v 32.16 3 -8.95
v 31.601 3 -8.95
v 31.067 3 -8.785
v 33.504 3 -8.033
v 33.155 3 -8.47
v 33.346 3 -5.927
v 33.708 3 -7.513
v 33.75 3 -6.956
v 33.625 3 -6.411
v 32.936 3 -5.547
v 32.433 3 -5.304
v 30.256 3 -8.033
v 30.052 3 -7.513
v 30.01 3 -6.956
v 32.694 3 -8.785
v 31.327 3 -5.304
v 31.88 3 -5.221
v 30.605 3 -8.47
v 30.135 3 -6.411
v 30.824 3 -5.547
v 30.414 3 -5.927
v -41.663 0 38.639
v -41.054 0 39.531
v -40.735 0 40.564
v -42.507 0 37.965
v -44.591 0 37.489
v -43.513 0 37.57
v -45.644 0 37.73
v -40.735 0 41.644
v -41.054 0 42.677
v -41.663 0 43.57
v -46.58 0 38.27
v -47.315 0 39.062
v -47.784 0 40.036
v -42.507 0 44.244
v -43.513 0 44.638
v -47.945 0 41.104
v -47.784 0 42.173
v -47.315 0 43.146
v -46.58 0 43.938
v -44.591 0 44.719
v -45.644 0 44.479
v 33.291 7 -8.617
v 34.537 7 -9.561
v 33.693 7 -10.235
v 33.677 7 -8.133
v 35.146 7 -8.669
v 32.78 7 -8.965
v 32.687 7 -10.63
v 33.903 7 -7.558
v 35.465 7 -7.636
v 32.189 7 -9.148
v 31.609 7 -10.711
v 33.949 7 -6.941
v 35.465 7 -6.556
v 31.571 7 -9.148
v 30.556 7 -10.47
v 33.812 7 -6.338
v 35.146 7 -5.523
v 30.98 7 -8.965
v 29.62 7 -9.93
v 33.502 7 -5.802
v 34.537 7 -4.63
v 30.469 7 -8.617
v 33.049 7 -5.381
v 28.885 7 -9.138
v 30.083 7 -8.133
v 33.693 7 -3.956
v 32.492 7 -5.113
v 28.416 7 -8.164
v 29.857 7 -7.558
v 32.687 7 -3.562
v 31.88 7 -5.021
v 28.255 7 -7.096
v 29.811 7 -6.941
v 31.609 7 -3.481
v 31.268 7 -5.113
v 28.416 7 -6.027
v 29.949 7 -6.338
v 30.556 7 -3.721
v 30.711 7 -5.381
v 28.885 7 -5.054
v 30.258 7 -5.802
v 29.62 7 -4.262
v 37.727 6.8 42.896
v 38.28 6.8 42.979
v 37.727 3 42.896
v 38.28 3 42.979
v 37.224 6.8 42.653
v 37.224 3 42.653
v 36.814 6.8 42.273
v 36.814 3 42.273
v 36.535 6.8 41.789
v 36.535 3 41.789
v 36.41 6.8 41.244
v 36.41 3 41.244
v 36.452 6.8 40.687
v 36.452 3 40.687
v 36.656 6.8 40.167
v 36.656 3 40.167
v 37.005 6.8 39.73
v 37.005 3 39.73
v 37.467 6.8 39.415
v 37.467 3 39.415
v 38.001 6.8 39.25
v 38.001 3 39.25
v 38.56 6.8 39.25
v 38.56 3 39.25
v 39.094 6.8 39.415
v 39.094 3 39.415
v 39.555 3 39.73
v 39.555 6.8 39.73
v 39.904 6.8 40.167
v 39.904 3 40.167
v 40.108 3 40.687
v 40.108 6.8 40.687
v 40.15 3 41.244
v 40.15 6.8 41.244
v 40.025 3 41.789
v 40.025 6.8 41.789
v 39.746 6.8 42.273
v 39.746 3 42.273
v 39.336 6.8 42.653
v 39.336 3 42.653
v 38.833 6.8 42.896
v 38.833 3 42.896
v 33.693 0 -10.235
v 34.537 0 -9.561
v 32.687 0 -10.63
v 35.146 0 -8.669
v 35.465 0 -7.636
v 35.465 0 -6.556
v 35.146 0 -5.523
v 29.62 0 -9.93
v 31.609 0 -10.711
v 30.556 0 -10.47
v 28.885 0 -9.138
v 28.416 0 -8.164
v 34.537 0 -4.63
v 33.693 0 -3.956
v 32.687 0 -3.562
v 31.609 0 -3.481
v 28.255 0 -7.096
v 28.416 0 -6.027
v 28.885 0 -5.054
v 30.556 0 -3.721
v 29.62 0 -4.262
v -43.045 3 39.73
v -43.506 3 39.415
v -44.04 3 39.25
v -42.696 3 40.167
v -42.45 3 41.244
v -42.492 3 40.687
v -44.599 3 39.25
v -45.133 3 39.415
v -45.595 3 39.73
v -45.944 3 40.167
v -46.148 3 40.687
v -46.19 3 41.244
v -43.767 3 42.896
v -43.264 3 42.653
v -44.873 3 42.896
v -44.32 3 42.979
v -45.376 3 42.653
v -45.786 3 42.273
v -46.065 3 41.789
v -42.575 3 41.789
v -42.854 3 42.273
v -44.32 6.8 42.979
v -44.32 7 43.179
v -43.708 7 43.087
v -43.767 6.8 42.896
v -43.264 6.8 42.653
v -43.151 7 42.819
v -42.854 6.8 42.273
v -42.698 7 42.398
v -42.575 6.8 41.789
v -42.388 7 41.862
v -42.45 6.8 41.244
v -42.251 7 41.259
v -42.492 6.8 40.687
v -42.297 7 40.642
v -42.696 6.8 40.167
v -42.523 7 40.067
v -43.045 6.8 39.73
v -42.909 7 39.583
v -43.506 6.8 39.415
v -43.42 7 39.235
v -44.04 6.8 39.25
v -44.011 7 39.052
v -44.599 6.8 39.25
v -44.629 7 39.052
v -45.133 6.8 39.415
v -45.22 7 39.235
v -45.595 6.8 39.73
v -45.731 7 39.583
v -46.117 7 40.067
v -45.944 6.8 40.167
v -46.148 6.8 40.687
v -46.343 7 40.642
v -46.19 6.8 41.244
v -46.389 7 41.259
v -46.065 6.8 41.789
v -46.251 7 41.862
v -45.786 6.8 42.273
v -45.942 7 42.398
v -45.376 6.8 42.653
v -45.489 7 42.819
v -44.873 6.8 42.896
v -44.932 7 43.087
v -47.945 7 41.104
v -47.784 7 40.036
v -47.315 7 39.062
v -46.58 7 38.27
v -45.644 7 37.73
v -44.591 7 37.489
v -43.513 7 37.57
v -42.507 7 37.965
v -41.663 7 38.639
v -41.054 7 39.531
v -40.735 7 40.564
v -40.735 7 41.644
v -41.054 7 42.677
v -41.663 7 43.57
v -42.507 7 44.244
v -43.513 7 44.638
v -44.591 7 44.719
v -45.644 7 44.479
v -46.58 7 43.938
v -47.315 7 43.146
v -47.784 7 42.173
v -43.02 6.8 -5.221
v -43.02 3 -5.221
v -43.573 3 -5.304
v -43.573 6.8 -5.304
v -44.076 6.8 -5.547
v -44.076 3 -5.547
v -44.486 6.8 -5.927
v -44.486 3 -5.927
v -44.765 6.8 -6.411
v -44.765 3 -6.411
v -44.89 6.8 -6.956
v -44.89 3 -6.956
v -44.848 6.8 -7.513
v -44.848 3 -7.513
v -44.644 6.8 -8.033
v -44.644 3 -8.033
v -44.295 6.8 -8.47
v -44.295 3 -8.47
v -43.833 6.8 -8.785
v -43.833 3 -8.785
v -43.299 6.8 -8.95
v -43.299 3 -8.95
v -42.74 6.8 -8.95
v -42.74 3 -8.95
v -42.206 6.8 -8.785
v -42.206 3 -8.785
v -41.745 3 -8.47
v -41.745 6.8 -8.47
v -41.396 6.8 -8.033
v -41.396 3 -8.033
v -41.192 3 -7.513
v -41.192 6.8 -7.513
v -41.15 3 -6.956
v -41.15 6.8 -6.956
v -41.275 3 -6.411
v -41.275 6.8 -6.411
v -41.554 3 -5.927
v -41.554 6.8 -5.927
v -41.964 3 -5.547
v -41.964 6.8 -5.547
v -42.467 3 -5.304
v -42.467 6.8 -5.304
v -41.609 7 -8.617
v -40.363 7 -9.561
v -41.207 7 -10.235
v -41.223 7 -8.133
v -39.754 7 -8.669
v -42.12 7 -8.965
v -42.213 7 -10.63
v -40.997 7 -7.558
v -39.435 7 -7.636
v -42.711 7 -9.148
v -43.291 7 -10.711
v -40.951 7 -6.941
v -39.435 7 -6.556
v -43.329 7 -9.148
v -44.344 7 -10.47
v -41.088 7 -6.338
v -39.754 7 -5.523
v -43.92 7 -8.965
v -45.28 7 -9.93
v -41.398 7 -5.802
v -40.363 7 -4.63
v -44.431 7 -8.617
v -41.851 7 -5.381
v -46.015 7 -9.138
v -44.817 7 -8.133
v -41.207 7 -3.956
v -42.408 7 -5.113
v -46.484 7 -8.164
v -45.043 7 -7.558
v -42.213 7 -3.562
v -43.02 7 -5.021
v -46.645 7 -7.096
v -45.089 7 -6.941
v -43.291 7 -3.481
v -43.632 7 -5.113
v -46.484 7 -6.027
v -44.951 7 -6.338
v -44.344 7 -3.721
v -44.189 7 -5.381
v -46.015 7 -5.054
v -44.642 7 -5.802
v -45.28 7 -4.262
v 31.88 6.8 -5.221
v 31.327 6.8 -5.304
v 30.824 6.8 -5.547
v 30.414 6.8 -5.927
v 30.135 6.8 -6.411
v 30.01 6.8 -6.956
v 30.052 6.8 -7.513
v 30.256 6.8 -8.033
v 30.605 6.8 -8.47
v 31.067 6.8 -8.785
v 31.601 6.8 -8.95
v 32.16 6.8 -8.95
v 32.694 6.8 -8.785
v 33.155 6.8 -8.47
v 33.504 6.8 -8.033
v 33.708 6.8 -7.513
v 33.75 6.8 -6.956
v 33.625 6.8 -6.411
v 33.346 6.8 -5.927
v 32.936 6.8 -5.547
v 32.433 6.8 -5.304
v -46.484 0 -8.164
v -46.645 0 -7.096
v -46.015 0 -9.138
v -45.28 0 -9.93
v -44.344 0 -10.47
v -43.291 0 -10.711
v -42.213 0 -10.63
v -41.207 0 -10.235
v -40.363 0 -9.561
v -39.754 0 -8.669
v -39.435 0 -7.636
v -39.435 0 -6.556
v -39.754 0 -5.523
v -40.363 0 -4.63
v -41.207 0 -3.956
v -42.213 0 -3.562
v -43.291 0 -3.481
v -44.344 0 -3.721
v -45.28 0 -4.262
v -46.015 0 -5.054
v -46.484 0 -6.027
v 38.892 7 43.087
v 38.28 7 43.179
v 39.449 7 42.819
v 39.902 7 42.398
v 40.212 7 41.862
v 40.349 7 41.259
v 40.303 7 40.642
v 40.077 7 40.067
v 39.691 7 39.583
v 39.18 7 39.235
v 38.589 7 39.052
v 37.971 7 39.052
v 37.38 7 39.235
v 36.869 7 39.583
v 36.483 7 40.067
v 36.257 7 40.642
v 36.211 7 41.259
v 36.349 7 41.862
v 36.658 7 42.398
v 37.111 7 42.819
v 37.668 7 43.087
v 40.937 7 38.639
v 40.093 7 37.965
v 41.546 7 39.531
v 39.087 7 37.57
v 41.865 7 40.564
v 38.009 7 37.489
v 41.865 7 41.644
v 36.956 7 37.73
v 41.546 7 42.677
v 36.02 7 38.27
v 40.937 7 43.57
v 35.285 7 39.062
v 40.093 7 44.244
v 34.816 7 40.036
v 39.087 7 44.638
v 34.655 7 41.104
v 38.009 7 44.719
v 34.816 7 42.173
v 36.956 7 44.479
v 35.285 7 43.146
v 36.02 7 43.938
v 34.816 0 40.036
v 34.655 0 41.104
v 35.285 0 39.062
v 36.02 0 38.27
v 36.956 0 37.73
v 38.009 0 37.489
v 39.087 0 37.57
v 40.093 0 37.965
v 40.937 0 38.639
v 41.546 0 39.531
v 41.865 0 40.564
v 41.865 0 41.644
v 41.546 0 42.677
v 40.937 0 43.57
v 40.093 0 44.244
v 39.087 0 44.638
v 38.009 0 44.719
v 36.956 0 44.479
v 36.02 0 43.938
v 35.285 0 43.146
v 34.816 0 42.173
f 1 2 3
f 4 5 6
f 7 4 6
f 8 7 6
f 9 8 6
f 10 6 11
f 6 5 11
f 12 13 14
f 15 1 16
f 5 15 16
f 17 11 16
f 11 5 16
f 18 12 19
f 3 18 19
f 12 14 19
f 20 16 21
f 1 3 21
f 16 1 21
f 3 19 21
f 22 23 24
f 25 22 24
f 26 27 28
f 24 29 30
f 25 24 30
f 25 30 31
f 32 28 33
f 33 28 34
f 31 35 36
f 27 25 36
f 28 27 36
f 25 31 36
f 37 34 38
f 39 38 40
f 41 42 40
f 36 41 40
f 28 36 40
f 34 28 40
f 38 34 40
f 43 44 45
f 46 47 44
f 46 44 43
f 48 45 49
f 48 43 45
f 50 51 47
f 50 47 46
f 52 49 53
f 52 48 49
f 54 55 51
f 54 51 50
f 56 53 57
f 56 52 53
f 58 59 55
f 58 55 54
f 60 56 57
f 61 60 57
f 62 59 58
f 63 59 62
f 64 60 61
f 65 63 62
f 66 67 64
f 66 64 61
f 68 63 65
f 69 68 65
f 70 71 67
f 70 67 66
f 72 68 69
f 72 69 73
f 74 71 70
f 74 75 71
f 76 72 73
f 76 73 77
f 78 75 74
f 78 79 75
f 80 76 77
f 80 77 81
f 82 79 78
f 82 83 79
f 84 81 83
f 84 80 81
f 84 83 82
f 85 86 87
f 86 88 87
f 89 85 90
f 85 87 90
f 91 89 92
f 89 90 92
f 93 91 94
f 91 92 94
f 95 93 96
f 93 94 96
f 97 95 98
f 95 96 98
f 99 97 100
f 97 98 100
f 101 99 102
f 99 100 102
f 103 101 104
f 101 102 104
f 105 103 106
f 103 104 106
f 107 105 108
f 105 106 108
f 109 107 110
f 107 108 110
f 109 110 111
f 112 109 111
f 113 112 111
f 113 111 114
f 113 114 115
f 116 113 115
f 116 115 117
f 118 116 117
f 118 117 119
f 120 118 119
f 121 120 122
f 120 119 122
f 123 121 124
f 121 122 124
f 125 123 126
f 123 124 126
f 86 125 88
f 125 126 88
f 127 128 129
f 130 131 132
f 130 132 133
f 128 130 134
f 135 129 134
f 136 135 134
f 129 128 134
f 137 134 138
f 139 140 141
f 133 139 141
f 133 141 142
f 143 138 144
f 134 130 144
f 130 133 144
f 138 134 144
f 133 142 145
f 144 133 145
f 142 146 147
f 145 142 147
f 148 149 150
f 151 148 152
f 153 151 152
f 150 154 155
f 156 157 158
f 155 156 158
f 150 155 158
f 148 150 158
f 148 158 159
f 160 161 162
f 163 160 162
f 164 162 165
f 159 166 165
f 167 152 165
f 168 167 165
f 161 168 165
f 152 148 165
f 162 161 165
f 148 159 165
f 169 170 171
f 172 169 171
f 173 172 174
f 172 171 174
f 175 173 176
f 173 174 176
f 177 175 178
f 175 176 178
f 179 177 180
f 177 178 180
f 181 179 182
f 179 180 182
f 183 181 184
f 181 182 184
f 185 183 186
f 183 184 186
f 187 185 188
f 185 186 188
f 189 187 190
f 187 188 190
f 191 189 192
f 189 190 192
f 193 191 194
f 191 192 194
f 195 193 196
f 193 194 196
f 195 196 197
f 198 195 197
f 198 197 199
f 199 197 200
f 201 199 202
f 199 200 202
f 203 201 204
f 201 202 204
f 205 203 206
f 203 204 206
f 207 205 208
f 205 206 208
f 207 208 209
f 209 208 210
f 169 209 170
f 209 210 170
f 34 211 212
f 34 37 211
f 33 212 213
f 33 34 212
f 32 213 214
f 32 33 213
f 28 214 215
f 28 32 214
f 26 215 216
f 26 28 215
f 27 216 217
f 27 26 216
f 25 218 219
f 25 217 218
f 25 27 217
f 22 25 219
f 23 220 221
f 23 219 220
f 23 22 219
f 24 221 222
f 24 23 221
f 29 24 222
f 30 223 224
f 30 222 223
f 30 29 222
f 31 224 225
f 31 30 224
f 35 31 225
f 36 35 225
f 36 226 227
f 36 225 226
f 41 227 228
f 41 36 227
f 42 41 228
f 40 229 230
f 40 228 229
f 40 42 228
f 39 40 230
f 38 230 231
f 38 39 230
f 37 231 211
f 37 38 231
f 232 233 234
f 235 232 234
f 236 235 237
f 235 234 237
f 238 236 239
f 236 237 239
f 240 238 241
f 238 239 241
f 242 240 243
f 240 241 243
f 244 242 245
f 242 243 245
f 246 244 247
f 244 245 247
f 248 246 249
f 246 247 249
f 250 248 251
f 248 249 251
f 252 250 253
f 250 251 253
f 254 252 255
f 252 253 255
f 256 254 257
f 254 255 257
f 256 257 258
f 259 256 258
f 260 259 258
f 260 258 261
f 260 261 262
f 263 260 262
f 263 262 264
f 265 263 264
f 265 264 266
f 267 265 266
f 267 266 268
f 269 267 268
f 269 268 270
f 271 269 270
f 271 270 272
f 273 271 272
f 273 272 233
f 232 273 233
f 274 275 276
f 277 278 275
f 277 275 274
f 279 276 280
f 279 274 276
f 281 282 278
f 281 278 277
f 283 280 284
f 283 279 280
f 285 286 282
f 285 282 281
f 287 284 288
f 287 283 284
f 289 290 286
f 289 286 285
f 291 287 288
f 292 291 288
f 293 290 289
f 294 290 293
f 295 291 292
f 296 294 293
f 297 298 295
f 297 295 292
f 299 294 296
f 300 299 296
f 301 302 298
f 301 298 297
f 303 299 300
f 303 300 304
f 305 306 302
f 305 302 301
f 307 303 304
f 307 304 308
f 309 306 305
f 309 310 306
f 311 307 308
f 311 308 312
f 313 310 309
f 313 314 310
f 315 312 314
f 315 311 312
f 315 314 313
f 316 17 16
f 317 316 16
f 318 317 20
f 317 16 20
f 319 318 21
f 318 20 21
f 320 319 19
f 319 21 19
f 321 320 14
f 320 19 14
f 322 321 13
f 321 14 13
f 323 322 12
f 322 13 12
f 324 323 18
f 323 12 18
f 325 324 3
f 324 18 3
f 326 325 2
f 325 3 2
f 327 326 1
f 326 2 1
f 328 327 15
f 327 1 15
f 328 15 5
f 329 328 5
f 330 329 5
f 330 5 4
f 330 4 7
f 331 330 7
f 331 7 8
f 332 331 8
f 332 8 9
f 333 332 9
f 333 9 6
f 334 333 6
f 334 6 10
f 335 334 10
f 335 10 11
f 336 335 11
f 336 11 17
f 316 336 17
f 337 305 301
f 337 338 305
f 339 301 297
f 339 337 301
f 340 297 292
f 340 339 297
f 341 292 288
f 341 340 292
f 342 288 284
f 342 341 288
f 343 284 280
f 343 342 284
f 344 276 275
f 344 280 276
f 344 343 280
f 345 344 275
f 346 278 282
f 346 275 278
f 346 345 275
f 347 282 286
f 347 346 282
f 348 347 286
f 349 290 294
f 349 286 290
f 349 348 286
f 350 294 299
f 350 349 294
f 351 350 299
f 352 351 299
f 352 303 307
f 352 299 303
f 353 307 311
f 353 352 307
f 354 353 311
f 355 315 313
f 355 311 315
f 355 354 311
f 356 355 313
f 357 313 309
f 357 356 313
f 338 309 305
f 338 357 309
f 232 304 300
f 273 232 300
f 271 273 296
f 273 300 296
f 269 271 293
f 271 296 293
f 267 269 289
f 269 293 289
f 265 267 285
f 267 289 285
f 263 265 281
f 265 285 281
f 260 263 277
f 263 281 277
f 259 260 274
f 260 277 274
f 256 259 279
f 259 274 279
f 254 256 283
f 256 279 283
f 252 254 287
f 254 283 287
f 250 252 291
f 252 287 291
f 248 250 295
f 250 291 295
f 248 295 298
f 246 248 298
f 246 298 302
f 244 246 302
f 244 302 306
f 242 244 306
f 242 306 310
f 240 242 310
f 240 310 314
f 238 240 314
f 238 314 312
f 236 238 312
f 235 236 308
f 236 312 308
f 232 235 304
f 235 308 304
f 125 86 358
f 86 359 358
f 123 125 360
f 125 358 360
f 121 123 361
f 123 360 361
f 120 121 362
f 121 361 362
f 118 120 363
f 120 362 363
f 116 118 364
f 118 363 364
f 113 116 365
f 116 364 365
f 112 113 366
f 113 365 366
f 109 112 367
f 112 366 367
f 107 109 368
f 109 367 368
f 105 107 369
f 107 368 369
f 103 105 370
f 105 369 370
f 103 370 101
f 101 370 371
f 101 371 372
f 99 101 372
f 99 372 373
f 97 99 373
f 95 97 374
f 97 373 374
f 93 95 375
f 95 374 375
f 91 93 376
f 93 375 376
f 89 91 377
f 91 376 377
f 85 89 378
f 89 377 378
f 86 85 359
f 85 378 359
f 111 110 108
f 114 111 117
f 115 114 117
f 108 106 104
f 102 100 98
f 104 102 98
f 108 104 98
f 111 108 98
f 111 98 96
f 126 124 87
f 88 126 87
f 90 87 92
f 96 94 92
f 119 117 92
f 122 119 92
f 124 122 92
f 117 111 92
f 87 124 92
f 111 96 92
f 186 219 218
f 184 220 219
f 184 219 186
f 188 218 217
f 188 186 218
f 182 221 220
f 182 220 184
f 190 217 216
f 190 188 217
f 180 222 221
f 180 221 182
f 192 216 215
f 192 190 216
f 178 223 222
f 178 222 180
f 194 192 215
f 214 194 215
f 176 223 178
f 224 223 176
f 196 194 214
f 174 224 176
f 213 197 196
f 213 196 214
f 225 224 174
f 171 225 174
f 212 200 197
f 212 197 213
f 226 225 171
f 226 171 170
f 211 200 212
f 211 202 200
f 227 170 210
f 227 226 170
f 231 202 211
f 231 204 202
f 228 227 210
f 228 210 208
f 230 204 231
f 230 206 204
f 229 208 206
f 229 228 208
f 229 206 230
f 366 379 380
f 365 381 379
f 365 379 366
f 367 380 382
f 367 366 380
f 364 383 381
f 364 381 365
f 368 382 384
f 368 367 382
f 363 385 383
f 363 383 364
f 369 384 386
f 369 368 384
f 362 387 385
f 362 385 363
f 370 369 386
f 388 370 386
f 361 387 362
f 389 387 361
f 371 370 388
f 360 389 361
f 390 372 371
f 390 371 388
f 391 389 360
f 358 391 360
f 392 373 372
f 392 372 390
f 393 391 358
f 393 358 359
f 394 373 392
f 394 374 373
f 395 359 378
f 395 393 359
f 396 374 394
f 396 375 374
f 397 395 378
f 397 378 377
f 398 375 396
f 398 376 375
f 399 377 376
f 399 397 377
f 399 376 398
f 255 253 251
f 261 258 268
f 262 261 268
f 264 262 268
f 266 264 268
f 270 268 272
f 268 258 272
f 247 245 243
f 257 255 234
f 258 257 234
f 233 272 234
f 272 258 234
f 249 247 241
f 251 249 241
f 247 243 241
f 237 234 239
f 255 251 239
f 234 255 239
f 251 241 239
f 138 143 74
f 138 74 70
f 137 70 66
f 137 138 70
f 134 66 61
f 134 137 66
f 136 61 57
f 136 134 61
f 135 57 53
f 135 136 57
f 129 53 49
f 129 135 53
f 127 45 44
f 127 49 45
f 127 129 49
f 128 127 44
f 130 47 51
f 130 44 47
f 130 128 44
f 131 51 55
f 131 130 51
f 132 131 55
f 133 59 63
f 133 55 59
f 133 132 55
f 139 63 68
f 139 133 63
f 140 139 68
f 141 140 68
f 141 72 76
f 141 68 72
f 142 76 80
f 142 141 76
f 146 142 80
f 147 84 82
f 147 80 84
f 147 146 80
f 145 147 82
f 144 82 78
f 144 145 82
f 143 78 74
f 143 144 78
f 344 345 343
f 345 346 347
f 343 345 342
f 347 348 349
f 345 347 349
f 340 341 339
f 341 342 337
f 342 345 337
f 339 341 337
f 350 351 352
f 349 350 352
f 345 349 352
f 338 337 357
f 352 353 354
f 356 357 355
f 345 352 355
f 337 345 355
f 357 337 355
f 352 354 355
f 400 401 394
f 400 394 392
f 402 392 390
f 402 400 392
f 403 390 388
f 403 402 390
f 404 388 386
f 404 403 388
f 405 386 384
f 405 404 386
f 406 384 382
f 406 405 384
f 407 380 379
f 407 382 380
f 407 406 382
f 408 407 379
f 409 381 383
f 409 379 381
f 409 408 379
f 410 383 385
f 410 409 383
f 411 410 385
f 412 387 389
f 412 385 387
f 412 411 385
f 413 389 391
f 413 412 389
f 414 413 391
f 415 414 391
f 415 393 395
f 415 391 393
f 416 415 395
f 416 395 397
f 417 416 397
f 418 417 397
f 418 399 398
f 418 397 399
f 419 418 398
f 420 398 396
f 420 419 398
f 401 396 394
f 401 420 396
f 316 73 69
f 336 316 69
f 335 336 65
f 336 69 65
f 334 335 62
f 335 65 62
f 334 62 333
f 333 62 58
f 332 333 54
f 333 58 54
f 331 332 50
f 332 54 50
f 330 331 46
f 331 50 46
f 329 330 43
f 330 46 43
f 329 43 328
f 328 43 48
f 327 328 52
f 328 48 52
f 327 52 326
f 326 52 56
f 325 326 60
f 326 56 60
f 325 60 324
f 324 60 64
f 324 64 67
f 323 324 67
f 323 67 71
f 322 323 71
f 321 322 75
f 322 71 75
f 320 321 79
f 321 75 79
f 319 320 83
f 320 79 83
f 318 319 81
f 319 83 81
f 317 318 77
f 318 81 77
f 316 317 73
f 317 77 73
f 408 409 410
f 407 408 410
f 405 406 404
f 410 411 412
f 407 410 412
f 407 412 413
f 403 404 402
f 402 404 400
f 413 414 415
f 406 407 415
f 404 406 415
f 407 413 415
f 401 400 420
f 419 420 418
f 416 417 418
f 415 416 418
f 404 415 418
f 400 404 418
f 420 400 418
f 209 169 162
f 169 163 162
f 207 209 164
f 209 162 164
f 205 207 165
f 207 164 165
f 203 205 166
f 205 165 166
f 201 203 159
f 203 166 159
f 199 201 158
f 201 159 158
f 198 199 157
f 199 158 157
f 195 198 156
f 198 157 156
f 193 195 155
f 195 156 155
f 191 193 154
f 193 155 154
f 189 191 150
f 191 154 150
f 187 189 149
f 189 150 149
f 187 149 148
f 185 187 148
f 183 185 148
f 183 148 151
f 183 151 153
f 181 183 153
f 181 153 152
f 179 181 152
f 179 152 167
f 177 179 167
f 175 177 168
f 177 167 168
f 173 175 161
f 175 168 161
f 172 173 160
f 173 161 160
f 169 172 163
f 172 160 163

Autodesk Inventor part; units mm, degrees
ref_plane "YZ Plane" through (0, 0, 0) normal (1, 0, 0) x (0, 1, 0)
ref_plane "XZ Plane" through (0, 0, 0) normal (0, 1, 0) x (-1, 0, 0)
ref_plane "XY Plane" through (0, 0, 0) normal (0, 0, 1) x (1, 0, 0)
sketch "Sketch1" plane through (0, 0, 0) normal (0, 1, 0) x (-1, 0, 0)
  circle A0 centre (43.0199, -7.0958) radius 1.625 construction
  circle A1 centre (-31.8801, -7.0958) radius 1.625 construction
  circle A2 centre (44.3199, 41.1042) radius 1.625 construction
  circle A3 centre (-38.2801, 41.1042) radius 1.625 construction
  line L0 (58.8879, -10.055) -> (-40.7911, -10.055) construction
  line L1 (-40.7911, -10.055) -> (-40.7911, 44.0634) construction
  line L2 (-40.7911, 44.0634) -> (58.8879, 44.0634) construction
  line L3 (58.8879, 44.0634) -> (58.8879, -10.055) construction
  line L4 (43.0199, -7.0958) -> (43.0199, -10.055)
  line L5 (44.3199, 41.1042) -> (44.3199, 44.0634)
  dimension "d0" = 3.25
  dimension "d1" = 74.9
  dimension "d2" = 1.3
  dimension "d3" = 48.2
  dimension "d5" = 82.6
  dimension "d9" = 15.868
  dimension "d10" = 54.1184
  dimension "d11" = 99.679
sketch "Sketch2" plane through (0, 0, 0) normal (0, 1, 0) x (-1, 0, 0)
  circle A0 centre (43.0199, -7.0958) radius 1.625 construction
  circle A1 centre (-31.8801, -7.0958) radius 1.625 construction
  circle A2 centre (-38.2801, 41.1042) radius 1.625 construction
  circle A3 centre (44.3199, 41.1042) radius 1.625 construction
  circle A4 centre (43.0199, -7.0958) radius 3.625
  circle A5 centre (-31.8801, -7.0958) radius 3.625
  circle A6 centre (-38.2801, 41.1042) radius 3.625
  circle A7 centre (44.3199, 41.1042) radius 3.625
  point P0 (0, 0)
  dimension "d6" = 2
extrude "Extrusion1" add sketch "Sketch2" along normal blind 7
sketch "Sketch3" plane through (-43.0199, 7, -7.0958) normal (0, 1, 0) x (1, 0, 0)
  circle A0 centre (0, 0) radius 3.625 projected
  circle A1 centre (74.9, 0) radius 3.625 projected
  circle A2 centre (81.3, -48.2) radius 3.625 projected
  circle A3 centre (-1.3, -48.2) radius 3.625 projected
  point P0 (43.0199, -7.0958)
hole "Hole1" at (-43.0199, 7, -7.0958) at (31.8801, 7, -7.0958) at (38.2801, 7, 41.1042) at (-44.3199, 7, 41.1042) direction (0, -1, 0) diameter 3.75 depth 4
chamfer "Chamfer1" distance 0.2 angle 45 4 edges at (-44.3199, 7, 39.2292) (38.2801, 7, 39.2292) (31.8801, 7, -8.9708) (-43.0199, 7, -8.9708)
properties part number "arduino_mega_standoffs"
